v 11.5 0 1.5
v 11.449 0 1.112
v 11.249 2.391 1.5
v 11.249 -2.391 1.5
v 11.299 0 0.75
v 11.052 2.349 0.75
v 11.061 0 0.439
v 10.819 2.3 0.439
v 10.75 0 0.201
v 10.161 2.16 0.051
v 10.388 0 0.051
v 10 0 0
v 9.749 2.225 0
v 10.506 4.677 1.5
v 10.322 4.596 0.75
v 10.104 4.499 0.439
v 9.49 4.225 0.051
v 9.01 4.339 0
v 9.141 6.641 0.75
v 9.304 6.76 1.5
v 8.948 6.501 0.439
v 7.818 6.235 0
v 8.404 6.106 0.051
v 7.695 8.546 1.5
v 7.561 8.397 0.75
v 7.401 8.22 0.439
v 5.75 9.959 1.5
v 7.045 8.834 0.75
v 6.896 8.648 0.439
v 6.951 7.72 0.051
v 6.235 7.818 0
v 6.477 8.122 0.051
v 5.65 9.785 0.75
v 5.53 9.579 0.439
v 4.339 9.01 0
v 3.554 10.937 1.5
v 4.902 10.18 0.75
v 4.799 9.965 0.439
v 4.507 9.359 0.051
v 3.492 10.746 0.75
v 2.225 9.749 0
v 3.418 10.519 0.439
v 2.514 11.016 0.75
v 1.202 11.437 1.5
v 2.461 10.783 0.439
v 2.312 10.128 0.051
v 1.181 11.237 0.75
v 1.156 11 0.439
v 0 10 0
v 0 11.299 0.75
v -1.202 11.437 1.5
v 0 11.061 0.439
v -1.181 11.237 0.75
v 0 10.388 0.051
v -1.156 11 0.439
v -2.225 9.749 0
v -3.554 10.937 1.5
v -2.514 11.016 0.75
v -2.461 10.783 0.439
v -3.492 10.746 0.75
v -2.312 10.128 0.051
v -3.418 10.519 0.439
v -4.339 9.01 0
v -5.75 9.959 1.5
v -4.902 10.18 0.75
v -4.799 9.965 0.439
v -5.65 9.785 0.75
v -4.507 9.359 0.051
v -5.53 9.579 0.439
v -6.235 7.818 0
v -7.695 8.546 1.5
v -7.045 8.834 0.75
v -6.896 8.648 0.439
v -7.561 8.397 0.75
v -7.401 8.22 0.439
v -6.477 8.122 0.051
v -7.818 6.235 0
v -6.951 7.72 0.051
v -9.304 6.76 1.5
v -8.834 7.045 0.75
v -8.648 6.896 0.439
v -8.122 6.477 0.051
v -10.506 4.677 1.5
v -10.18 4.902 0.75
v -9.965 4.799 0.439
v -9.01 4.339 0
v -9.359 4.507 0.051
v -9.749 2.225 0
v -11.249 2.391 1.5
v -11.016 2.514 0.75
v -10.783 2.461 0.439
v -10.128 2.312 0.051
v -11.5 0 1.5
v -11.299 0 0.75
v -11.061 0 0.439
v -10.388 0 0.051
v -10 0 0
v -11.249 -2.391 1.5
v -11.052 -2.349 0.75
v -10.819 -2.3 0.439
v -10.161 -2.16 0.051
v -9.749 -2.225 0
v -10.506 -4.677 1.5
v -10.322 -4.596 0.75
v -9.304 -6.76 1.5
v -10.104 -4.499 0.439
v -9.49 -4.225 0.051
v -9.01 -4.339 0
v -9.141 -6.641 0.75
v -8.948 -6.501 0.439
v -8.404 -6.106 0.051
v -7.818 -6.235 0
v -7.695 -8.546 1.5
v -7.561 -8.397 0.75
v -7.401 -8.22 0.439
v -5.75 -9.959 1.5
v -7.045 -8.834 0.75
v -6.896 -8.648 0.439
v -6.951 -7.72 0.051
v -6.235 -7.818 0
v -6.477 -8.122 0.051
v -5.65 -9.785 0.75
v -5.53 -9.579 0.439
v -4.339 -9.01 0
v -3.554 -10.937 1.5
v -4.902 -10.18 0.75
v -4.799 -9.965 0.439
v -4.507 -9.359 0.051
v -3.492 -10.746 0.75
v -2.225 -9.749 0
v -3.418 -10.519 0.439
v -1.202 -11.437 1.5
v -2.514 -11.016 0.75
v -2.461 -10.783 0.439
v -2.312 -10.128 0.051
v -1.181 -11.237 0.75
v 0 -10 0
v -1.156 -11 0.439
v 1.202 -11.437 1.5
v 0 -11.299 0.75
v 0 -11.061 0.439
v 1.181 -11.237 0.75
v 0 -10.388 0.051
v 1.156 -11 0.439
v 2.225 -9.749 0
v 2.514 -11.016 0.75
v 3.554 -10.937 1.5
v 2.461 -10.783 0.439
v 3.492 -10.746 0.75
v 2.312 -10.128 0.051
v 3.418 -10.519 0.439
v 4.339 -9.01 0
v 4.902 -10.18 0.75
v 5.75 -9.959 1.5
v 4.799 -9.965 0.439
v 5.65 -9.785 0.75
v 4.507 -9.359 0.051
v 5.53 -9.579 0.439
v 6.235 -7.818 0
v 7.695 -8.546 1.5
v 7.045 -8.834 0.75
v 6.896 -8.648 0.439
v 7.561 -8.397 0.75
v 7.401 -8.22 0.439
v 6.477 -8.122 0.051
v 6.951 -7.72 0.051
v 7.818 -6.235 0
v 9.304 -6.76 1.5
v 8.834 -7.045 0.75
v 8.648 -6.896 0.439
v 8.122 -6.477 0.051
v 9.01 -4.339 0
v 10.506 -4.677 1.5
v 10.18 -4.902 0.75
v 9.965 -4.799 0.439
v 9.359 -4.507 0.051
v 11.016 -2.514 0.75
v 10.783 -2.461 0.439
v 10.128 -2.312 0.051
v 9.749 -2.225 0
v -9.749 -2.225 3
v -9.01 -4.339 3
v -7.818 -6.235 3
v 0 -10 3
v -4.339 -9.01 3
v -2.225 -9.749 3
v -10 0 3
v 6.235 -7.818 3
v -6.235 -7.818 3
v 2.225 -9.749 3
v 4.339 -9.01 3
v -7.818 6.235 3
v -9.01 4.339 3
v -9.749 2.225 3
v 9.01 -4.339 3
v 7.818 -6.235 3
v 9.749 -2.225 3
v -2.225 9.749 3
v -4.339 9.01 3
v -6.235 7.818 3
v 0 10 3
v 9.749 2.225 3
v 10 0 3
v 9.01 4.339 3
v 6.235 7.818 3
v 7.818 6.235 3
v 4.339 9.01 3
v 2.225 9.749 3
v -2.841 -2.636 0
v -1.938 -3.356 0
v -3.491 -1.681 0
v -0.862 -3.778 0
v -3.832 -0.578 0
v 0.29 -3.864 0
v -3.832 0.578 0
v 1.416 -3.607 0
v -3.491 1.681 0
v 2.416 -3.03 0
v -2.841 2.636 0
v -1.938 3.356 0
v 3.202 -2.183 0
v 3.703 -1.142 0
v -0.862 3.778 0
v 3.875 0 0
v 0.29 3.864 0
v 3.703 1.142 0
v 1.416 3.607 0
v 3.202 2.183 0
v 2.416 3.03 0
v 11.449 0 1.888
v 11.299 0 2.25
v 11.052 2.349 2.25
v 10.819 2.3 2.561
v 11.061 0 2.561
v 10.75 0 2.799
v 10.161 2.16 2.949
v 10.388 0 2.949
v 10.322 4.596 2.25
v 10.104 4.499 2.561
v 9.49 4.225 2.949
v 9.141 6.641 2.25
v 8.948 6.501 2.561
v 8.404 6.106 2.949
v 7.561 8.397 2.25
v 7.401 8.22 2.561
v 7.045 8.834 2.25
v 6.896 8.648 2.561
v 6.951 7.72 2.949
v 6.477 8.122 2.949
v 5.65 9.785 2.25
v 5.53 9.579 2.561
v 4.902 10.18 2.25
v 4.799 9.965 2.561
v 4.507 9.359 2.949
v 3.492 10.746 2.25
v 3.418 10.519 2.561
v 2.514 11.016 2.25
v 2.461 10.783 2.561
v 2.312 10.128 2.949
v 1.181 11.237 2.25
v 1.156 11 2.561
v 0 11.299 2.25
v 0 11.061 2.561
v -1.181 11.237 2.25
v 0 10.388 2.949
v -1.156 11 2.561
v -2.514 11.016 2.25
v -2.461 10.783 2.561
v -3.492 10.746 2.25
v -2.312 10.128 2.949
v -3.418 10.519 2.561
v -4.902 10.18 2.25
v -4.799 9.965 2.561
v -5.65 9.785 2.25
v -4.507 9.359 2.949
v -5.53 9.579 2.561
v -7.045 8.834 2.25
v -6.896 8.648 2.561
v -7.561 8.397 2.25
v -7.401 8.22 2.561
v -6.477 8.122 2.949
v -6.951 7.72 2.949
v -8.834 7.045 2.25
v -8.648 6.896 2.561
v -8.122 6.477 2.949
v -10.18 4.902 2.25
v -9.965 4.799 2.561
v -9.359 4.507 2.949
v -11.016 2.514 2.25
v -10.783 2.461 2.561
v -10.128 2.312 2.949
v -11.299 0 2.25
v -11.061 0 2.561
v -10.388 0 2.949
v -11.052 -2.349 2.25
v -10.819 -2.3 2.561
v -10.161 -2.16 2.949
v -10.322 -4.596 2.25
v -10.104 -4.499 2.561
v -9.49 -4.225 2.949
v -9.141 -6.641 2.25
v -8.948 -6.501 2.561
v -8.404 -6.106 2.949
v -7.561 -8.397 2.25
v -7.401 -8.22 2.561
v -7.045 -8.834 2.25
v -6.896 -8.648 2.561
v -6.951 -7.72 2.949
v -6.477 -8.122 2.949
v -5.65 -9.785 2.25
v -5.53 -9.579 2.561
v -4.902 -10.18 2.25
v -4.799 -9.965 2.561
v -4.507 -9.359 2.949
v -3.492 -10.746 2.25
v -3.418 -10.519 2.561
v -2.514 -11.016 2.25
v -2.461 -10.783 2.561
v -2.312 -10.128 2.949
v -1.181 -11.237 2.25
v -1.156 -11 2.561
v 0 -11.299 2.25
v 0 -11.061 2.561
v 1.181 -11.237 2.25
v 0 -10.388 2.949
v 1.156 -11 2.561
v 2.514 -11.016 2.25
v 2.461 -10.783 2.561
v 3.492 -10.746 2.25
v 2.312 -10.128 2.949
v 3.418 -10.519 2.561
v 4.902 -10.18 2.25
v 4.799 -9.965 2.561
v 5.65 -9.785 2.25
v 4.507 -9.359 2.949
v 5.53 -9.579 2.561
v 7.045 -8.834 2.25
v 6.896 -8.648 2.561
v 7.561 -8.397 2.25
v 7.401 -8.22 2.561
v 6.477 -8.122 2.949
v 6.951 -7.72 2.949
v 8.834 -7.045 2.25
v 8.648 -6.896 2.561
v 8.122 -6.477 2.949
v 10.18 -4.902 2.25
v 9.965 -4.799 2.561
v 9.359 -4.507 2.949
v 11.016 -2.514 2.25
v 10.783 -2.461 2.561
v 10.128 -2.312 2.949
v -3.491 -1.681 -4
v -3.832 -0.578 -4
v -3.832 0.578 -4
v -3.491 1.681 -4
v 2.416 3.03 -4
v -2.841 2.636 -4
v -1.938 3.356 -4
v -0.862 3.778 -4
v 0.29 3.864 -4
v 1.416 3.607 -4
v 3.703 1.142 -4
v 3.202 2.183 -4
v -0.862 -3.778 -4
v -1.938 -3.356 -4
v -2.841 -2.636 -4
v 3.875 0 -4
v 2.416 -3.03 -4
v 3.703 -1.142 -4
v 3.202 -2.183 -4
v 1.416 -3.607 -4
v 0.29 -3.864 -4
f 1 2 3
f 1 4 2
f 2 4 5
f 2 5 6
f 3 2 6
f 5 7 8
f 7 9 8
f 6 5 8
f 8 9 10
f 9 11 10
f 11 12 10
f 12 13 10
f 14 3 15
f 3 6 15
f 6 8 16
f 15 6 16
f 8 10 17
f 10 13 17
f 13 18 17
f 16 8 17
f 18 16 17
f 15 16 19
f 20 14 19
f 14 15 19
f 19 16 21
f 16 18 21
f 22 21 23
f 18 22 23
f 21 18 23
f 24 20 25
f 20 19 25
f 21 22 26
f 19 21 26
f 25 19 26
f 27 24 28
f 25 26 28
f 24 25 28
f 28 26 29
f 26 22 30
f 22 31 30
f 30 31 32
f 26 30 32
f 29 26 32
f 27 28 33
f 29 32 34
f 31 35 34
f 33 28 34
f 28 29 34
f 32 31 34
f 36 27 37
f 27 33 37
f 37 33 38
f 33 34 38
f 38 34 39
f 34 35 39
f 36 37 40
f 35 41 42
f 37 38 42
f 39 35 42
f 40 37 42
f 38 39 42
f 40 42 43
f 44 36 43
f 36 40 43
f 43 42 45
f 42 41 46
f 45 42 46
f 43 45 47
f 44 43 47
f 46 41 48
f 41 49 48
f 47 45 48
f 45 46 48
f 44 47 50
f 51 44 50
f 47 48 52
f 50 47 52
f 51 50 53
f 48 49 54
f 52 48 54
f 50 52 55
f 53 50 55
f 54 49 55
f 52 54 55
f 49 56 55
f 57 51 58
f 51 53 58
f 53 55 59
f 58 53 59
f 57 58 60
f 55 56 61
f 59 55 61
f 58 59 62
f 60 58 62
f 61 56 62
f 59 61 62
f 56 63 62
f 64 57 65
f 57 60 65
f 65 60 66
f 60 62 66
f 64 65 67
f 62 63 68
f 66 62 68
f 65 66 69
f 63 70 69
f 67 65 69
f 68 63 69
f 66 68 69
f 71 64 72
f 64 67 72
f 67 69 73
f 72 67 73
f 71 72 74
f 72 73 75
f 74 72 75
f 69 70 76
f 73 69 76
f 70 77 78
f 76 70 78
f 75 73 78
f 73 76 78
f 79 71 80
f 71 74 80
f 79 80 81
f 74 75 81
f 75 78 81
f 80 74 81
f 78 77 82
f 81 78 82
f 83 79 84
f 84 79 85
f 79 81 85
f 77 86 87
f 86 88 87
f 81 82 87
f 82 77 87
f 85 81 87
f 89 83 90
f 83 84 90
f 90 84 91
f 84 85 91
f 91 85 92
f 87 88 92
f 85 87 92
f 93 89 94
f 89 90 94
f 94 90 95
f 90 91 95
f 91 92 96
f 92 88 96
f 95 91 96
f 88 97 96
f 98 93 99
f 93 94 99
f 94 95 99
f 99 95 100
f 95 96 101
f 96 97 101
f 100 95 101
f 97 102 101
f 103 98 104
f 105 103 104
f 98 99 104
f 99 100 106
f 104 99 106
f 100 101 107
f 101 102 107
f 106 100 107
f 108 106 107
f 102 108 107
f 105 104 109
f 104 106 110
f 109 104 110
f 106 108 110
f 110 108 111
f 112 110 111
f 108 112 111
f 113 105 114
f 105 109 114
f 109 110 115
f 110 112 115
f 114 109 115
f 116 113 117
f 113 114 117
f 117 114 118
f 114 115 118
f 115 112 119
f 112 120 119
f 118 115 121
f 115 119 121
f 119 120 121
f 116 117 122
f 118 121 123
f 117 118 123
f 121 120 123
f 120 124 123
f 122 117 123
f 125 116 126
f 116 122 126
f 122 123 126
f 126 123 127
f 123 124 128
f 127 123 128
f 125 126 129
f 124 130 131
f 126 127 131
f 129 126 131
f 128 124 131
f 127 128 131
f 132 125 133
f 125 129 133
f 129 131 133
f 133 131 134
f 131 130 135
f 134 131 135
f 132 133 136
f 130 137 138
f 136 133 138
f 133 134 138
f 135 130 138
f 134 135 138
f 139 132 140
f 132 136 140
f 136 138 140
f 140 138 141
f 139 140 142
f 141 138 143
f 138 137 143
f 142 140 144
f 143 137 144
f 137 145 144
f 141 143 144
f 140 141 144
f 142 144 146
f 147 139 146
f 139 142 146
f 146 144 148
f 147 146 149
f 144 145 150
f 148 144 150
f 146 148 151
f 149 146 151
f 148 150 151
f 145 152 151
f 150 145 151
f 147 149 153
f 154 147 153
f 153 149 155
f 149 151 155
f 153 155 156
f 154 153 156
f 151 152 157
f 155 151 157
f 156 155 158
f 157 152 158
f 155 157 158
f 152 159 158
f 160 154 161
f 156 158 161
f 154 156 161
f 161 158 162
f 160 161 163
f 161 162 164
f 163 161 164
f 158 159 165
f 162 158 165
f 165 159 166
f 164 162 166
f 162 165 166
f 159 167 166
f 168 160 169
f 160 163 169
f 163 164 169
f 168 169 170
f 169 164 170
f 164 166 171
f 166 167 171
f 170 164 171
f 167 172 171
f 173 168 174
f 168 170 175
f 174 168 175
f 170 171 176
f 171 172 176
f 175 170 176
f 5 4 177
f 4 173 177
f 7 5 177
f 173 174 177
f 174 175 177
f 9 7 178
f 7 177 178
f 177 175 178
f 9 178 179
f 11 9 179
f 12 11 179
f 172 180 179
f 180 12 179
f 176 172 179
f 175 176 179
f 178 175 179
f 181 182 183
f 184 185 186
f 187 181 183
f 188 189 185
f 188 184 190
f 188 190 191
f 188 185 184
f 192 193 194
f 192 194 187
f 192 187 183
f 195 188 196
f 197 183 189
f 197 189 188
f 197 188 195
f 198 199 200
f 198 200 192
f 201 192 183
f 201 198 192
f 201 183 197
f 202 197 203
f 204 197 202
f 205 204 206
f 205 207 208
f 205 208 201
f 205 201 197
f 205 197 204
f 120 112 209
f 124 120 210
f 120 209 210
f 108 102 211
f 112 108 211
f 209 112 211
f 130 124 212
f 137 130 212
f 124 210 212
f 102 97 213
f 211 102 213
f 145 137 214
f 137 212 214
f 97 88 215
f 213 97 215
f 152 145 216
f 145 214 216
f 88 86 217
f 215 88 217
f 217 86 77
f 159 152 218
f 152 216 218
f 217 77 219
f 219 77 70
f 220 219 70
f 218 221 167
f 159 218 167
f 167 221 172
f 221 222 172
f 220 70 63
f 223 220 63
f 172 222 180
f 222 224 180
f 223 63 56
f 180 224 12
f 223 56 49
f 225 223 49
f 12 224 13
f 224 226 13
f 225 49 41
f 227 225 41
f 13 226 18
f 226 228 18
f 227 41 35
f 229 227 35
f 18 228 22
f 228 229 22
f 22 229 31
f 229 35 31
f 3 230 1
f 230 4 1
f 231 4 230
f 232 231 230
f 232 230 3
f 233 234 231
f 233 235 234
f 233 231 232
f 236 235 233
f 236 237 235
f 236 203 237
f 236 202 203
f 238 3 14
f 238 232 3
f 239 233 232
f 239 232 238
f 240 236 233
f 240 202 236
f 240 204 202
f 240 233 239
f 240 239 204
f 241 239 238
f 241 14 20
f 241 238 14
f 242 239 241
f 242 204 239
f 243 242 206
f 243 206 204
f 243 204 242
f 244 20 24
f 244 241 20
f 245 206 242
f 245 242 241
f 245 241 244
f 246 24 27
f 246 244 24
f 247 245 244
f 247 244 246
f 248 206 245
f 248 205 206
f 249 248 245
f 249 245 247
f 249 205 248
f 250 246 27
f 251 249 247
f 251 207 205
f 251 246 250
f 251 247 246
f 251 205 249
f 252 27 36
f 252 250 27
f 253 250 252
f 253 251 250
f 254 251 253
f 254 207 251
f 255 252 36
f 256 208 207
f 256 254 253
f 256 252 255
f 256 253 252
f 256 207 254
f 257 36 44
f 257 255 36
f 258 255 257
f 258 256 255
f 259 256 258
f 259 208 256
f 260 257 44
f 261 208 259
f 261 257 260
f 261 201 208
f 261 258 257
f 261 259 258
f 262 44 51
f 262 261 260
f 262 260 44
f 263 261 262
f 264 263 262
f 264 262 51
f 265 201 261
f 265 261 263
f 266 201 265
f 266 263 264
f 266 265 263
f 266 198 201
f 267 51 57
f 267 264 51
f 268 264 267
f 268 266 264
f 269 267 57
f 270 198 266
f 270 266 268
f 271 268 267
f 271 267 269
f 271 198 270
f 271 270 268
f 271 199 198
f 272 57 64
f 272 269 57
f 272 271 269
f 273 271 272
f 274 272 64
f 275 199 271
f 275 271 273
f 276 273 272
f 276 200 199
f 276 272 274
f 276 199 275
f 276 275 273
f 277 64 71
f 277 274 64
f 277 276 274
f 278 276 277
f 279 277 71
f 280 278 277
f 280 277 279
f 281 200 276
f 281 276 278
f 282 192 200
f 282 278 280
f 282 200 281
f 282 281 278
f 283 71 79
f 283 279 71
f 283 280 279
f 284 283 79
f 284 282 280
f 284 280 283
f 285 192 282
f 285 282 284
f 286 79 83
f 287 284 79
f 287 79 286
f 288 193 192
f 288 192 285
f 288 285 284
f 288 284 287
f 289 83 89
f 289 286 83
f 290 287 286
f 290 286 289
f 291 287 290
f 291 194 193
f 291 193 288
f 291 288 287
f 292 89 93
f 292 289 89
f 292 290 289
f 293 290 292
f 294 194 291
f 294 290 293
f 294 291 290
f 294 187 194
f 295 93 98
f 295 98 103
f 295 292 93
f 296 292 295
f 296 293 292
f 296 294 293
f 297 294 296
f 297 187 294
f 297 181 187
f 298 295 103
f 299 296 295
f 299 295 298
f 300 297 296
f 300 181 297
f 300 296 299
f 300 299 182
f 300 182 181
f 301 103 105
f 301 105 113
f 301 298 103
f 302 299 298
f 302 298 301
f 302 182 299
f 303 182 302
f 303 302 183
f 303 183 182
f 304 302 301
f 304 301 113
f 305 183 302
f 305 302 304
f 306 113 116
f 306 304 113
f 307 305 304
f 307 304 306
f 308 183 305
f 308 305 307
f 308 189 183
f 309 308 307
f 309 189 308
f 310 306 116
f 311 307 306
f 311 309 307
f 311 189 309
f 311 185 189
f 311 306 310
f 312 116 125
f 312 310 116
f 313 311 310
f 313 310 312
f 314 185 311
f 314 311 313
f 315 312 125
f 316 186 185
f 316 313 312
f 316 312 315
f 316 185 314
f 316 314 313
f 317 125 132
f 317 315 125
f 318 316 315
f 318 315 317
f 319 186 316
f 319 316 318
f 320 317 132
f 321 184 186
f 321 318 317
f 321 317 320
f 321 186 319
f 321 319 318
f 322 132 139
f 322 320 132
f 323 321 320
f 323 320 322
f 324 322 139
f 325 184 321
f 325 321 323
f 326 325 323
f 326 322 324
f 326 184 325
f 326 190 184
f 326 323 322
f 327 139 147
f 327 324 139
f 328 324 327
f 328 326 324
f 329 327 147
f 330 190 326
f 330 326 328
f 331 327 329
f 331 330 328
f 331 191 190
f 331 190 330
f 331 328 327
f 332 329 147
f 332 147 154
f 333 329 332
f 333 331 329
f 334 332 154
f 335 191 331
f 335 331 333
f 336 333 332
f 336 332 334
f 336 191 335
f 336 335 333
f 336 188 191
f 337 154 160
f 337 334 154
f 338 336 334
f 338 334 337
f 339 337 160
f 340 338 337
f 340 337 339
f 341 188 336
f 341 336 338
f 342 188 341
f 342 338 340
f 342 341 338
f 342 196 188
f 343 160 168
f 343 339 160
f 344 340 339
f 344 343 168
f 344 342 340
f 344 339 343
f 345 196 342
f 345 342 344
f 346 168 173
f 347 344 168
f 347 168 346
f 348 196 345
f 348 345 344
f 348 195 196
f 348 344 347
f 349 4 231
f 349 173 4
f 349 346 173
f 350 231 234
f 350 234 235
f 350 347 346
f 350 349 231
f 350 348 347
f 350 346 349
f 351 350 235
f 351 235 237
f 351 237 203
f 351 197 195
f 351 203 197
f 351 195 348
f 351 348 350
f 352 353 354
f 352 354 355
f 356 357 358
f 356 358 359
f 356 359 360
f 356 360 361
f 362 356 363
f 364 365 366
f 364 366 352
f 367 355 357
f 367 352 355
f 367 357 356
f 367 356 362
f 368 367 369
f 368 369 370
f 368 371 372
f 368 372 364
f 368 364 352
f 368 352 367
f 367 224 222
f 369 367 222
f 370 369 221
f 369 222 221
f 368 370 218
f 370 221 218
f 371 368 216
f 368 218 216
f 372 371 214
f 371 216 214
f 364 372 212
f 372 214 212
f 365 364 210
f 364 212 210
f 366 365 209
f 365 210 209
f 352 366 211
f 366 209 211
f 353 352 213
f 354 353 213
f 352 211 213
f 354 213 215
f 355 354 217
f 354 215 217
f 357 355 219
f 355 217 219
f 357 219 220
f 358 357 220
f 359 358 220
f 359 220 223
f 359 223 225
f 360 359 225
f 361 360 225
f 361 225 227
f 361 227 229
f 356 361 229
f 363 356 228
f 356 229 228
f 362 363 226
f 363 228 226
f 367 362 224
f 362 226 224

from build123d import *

# Parameters (mm, degrees)
F0_R     = 11.5
F1_DEPTH = 3
F2_R     = 1.5
F3_R     = 1.49999
F4_R     = 3.875
F5_DEPTH = 4


# Not quite as in the source:
# - a fillet or chamfer is up to 0.001 mm smaller than in the source, because OpenCascade refuses the exact size


with BuildPart() as f1:
    # F0 (on Top) → F1 (new body)
    with BuildSketch(Plane.XY):
        Circle(F0_R)
    extrude(amount=F1_DEPTH)

    # F2
    f2_edges = [f1.edges().sort_by_distance(p)[0] for p in [
        (-11.5, 0, 3),
    ]]
    fillet(f2_edges, radius=F2_R)

    # F3 (radius 1.5 in the source; OpenCascade refuses exactly that, so slightly less here)
    f3_edges = [f1.edges().sort_by_distance(p)[0] for p in [
        (-11.5, 0, 0),
    ]]
    fillet(f3_edges, radius=F3_R)

    # F4 (on face) → F5 (join)
    with BuildSketch(Plane(origin=(0, 0, 0), x_dir=(1, 0, 0), z_dir=(0, 0, -1))):
        Circle(F4_R)
    extrude(amount=F5_DEPTH)


solid = f1.part
